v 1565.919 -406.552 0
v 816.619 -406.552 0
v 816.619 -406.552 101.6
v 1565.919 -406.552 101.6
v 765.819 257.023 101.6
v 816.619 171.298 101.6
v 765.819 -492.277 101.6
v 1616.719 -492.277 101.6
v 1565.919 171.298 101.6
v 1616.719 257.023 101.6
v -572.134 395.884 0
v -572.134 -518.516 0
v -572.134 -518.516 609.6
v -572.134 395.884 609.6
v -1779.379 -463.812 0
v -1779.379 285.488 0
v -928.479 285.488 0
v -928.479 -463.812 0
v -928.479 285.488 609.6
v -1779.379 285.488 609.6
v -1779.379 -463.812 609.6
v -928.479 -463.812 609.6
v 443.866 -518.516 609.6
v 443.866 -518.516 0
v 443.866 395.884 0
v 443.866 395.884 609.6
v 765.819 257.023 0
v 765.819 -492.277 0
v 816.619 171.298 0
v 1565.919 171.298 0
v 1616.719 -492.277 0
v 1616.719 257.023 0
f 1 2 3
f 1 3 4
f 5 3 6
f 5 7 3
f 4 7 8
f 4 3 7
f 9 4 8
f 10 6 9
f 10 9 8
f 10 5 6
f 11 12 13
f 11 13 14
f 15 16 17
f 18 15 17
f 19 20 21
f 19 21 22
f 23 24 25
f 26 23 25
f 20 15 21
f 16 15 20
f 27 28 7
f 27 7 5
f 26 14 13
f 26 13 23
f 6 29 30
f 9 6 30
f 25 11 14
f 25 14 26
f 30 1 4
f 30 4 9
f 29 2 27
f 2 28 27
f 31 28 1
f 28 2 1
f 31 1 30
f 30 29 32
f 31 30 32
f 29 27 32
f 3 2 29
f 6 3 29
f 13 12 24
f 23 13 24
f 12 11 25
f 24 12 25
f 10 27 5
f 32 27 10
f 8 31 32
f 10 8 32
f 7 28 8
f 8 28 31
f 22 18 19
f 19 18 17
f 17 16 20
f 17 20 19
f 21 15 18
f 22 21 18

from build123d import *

# Parameters (mm, degrees)
F0_W     = 1016
F0_H     = 914.4
F1_DEPTH = 609.6
F2_W     = 850.9
F2_H     = 749.3
F3_DEPTH = 609.6
F4_W     = 850.9
F4_H     = 749.3
F4_W_2   = 749.3
F4_H_2   = 577.85
F5_DEPTH = 101.6


with BuildPart() as f1:
    # F0 (on Top) → F1 (new body)
    with BuildSketch(Plane.XY):
        with Locations((-64.1343, -61.316494)):
            Rectangle(F0_W, F0_H)
    extrude(amount=F1_DEPTH)


with BuildPart() as f3:
    # F2 (on Top) → F3 (new body)
    with BuildSketch(Plane.XY):
        with Locations((-1353.928777, -89.16247)):
            Rectangle(F2_W, F2_H)
    extrude(amount=F3_DEPTH)


with BuildPart() as f5:
    # F4 (on Top) → F5 (new body)
    with BuildSketch(Plane.XY):
        with Locations((1191.269279, -117.626861)):
            Rectangle(F4_W, F4_H)
        with Locations((1191.269279, -117.626861)):
            Rectangle(F4_W_2, F4_H_2, mode=Mode.SUBTRACT)
    extrude(amount=F5_DEPTH)


solid = Compound([f1.part, f3.part, f5.part])
